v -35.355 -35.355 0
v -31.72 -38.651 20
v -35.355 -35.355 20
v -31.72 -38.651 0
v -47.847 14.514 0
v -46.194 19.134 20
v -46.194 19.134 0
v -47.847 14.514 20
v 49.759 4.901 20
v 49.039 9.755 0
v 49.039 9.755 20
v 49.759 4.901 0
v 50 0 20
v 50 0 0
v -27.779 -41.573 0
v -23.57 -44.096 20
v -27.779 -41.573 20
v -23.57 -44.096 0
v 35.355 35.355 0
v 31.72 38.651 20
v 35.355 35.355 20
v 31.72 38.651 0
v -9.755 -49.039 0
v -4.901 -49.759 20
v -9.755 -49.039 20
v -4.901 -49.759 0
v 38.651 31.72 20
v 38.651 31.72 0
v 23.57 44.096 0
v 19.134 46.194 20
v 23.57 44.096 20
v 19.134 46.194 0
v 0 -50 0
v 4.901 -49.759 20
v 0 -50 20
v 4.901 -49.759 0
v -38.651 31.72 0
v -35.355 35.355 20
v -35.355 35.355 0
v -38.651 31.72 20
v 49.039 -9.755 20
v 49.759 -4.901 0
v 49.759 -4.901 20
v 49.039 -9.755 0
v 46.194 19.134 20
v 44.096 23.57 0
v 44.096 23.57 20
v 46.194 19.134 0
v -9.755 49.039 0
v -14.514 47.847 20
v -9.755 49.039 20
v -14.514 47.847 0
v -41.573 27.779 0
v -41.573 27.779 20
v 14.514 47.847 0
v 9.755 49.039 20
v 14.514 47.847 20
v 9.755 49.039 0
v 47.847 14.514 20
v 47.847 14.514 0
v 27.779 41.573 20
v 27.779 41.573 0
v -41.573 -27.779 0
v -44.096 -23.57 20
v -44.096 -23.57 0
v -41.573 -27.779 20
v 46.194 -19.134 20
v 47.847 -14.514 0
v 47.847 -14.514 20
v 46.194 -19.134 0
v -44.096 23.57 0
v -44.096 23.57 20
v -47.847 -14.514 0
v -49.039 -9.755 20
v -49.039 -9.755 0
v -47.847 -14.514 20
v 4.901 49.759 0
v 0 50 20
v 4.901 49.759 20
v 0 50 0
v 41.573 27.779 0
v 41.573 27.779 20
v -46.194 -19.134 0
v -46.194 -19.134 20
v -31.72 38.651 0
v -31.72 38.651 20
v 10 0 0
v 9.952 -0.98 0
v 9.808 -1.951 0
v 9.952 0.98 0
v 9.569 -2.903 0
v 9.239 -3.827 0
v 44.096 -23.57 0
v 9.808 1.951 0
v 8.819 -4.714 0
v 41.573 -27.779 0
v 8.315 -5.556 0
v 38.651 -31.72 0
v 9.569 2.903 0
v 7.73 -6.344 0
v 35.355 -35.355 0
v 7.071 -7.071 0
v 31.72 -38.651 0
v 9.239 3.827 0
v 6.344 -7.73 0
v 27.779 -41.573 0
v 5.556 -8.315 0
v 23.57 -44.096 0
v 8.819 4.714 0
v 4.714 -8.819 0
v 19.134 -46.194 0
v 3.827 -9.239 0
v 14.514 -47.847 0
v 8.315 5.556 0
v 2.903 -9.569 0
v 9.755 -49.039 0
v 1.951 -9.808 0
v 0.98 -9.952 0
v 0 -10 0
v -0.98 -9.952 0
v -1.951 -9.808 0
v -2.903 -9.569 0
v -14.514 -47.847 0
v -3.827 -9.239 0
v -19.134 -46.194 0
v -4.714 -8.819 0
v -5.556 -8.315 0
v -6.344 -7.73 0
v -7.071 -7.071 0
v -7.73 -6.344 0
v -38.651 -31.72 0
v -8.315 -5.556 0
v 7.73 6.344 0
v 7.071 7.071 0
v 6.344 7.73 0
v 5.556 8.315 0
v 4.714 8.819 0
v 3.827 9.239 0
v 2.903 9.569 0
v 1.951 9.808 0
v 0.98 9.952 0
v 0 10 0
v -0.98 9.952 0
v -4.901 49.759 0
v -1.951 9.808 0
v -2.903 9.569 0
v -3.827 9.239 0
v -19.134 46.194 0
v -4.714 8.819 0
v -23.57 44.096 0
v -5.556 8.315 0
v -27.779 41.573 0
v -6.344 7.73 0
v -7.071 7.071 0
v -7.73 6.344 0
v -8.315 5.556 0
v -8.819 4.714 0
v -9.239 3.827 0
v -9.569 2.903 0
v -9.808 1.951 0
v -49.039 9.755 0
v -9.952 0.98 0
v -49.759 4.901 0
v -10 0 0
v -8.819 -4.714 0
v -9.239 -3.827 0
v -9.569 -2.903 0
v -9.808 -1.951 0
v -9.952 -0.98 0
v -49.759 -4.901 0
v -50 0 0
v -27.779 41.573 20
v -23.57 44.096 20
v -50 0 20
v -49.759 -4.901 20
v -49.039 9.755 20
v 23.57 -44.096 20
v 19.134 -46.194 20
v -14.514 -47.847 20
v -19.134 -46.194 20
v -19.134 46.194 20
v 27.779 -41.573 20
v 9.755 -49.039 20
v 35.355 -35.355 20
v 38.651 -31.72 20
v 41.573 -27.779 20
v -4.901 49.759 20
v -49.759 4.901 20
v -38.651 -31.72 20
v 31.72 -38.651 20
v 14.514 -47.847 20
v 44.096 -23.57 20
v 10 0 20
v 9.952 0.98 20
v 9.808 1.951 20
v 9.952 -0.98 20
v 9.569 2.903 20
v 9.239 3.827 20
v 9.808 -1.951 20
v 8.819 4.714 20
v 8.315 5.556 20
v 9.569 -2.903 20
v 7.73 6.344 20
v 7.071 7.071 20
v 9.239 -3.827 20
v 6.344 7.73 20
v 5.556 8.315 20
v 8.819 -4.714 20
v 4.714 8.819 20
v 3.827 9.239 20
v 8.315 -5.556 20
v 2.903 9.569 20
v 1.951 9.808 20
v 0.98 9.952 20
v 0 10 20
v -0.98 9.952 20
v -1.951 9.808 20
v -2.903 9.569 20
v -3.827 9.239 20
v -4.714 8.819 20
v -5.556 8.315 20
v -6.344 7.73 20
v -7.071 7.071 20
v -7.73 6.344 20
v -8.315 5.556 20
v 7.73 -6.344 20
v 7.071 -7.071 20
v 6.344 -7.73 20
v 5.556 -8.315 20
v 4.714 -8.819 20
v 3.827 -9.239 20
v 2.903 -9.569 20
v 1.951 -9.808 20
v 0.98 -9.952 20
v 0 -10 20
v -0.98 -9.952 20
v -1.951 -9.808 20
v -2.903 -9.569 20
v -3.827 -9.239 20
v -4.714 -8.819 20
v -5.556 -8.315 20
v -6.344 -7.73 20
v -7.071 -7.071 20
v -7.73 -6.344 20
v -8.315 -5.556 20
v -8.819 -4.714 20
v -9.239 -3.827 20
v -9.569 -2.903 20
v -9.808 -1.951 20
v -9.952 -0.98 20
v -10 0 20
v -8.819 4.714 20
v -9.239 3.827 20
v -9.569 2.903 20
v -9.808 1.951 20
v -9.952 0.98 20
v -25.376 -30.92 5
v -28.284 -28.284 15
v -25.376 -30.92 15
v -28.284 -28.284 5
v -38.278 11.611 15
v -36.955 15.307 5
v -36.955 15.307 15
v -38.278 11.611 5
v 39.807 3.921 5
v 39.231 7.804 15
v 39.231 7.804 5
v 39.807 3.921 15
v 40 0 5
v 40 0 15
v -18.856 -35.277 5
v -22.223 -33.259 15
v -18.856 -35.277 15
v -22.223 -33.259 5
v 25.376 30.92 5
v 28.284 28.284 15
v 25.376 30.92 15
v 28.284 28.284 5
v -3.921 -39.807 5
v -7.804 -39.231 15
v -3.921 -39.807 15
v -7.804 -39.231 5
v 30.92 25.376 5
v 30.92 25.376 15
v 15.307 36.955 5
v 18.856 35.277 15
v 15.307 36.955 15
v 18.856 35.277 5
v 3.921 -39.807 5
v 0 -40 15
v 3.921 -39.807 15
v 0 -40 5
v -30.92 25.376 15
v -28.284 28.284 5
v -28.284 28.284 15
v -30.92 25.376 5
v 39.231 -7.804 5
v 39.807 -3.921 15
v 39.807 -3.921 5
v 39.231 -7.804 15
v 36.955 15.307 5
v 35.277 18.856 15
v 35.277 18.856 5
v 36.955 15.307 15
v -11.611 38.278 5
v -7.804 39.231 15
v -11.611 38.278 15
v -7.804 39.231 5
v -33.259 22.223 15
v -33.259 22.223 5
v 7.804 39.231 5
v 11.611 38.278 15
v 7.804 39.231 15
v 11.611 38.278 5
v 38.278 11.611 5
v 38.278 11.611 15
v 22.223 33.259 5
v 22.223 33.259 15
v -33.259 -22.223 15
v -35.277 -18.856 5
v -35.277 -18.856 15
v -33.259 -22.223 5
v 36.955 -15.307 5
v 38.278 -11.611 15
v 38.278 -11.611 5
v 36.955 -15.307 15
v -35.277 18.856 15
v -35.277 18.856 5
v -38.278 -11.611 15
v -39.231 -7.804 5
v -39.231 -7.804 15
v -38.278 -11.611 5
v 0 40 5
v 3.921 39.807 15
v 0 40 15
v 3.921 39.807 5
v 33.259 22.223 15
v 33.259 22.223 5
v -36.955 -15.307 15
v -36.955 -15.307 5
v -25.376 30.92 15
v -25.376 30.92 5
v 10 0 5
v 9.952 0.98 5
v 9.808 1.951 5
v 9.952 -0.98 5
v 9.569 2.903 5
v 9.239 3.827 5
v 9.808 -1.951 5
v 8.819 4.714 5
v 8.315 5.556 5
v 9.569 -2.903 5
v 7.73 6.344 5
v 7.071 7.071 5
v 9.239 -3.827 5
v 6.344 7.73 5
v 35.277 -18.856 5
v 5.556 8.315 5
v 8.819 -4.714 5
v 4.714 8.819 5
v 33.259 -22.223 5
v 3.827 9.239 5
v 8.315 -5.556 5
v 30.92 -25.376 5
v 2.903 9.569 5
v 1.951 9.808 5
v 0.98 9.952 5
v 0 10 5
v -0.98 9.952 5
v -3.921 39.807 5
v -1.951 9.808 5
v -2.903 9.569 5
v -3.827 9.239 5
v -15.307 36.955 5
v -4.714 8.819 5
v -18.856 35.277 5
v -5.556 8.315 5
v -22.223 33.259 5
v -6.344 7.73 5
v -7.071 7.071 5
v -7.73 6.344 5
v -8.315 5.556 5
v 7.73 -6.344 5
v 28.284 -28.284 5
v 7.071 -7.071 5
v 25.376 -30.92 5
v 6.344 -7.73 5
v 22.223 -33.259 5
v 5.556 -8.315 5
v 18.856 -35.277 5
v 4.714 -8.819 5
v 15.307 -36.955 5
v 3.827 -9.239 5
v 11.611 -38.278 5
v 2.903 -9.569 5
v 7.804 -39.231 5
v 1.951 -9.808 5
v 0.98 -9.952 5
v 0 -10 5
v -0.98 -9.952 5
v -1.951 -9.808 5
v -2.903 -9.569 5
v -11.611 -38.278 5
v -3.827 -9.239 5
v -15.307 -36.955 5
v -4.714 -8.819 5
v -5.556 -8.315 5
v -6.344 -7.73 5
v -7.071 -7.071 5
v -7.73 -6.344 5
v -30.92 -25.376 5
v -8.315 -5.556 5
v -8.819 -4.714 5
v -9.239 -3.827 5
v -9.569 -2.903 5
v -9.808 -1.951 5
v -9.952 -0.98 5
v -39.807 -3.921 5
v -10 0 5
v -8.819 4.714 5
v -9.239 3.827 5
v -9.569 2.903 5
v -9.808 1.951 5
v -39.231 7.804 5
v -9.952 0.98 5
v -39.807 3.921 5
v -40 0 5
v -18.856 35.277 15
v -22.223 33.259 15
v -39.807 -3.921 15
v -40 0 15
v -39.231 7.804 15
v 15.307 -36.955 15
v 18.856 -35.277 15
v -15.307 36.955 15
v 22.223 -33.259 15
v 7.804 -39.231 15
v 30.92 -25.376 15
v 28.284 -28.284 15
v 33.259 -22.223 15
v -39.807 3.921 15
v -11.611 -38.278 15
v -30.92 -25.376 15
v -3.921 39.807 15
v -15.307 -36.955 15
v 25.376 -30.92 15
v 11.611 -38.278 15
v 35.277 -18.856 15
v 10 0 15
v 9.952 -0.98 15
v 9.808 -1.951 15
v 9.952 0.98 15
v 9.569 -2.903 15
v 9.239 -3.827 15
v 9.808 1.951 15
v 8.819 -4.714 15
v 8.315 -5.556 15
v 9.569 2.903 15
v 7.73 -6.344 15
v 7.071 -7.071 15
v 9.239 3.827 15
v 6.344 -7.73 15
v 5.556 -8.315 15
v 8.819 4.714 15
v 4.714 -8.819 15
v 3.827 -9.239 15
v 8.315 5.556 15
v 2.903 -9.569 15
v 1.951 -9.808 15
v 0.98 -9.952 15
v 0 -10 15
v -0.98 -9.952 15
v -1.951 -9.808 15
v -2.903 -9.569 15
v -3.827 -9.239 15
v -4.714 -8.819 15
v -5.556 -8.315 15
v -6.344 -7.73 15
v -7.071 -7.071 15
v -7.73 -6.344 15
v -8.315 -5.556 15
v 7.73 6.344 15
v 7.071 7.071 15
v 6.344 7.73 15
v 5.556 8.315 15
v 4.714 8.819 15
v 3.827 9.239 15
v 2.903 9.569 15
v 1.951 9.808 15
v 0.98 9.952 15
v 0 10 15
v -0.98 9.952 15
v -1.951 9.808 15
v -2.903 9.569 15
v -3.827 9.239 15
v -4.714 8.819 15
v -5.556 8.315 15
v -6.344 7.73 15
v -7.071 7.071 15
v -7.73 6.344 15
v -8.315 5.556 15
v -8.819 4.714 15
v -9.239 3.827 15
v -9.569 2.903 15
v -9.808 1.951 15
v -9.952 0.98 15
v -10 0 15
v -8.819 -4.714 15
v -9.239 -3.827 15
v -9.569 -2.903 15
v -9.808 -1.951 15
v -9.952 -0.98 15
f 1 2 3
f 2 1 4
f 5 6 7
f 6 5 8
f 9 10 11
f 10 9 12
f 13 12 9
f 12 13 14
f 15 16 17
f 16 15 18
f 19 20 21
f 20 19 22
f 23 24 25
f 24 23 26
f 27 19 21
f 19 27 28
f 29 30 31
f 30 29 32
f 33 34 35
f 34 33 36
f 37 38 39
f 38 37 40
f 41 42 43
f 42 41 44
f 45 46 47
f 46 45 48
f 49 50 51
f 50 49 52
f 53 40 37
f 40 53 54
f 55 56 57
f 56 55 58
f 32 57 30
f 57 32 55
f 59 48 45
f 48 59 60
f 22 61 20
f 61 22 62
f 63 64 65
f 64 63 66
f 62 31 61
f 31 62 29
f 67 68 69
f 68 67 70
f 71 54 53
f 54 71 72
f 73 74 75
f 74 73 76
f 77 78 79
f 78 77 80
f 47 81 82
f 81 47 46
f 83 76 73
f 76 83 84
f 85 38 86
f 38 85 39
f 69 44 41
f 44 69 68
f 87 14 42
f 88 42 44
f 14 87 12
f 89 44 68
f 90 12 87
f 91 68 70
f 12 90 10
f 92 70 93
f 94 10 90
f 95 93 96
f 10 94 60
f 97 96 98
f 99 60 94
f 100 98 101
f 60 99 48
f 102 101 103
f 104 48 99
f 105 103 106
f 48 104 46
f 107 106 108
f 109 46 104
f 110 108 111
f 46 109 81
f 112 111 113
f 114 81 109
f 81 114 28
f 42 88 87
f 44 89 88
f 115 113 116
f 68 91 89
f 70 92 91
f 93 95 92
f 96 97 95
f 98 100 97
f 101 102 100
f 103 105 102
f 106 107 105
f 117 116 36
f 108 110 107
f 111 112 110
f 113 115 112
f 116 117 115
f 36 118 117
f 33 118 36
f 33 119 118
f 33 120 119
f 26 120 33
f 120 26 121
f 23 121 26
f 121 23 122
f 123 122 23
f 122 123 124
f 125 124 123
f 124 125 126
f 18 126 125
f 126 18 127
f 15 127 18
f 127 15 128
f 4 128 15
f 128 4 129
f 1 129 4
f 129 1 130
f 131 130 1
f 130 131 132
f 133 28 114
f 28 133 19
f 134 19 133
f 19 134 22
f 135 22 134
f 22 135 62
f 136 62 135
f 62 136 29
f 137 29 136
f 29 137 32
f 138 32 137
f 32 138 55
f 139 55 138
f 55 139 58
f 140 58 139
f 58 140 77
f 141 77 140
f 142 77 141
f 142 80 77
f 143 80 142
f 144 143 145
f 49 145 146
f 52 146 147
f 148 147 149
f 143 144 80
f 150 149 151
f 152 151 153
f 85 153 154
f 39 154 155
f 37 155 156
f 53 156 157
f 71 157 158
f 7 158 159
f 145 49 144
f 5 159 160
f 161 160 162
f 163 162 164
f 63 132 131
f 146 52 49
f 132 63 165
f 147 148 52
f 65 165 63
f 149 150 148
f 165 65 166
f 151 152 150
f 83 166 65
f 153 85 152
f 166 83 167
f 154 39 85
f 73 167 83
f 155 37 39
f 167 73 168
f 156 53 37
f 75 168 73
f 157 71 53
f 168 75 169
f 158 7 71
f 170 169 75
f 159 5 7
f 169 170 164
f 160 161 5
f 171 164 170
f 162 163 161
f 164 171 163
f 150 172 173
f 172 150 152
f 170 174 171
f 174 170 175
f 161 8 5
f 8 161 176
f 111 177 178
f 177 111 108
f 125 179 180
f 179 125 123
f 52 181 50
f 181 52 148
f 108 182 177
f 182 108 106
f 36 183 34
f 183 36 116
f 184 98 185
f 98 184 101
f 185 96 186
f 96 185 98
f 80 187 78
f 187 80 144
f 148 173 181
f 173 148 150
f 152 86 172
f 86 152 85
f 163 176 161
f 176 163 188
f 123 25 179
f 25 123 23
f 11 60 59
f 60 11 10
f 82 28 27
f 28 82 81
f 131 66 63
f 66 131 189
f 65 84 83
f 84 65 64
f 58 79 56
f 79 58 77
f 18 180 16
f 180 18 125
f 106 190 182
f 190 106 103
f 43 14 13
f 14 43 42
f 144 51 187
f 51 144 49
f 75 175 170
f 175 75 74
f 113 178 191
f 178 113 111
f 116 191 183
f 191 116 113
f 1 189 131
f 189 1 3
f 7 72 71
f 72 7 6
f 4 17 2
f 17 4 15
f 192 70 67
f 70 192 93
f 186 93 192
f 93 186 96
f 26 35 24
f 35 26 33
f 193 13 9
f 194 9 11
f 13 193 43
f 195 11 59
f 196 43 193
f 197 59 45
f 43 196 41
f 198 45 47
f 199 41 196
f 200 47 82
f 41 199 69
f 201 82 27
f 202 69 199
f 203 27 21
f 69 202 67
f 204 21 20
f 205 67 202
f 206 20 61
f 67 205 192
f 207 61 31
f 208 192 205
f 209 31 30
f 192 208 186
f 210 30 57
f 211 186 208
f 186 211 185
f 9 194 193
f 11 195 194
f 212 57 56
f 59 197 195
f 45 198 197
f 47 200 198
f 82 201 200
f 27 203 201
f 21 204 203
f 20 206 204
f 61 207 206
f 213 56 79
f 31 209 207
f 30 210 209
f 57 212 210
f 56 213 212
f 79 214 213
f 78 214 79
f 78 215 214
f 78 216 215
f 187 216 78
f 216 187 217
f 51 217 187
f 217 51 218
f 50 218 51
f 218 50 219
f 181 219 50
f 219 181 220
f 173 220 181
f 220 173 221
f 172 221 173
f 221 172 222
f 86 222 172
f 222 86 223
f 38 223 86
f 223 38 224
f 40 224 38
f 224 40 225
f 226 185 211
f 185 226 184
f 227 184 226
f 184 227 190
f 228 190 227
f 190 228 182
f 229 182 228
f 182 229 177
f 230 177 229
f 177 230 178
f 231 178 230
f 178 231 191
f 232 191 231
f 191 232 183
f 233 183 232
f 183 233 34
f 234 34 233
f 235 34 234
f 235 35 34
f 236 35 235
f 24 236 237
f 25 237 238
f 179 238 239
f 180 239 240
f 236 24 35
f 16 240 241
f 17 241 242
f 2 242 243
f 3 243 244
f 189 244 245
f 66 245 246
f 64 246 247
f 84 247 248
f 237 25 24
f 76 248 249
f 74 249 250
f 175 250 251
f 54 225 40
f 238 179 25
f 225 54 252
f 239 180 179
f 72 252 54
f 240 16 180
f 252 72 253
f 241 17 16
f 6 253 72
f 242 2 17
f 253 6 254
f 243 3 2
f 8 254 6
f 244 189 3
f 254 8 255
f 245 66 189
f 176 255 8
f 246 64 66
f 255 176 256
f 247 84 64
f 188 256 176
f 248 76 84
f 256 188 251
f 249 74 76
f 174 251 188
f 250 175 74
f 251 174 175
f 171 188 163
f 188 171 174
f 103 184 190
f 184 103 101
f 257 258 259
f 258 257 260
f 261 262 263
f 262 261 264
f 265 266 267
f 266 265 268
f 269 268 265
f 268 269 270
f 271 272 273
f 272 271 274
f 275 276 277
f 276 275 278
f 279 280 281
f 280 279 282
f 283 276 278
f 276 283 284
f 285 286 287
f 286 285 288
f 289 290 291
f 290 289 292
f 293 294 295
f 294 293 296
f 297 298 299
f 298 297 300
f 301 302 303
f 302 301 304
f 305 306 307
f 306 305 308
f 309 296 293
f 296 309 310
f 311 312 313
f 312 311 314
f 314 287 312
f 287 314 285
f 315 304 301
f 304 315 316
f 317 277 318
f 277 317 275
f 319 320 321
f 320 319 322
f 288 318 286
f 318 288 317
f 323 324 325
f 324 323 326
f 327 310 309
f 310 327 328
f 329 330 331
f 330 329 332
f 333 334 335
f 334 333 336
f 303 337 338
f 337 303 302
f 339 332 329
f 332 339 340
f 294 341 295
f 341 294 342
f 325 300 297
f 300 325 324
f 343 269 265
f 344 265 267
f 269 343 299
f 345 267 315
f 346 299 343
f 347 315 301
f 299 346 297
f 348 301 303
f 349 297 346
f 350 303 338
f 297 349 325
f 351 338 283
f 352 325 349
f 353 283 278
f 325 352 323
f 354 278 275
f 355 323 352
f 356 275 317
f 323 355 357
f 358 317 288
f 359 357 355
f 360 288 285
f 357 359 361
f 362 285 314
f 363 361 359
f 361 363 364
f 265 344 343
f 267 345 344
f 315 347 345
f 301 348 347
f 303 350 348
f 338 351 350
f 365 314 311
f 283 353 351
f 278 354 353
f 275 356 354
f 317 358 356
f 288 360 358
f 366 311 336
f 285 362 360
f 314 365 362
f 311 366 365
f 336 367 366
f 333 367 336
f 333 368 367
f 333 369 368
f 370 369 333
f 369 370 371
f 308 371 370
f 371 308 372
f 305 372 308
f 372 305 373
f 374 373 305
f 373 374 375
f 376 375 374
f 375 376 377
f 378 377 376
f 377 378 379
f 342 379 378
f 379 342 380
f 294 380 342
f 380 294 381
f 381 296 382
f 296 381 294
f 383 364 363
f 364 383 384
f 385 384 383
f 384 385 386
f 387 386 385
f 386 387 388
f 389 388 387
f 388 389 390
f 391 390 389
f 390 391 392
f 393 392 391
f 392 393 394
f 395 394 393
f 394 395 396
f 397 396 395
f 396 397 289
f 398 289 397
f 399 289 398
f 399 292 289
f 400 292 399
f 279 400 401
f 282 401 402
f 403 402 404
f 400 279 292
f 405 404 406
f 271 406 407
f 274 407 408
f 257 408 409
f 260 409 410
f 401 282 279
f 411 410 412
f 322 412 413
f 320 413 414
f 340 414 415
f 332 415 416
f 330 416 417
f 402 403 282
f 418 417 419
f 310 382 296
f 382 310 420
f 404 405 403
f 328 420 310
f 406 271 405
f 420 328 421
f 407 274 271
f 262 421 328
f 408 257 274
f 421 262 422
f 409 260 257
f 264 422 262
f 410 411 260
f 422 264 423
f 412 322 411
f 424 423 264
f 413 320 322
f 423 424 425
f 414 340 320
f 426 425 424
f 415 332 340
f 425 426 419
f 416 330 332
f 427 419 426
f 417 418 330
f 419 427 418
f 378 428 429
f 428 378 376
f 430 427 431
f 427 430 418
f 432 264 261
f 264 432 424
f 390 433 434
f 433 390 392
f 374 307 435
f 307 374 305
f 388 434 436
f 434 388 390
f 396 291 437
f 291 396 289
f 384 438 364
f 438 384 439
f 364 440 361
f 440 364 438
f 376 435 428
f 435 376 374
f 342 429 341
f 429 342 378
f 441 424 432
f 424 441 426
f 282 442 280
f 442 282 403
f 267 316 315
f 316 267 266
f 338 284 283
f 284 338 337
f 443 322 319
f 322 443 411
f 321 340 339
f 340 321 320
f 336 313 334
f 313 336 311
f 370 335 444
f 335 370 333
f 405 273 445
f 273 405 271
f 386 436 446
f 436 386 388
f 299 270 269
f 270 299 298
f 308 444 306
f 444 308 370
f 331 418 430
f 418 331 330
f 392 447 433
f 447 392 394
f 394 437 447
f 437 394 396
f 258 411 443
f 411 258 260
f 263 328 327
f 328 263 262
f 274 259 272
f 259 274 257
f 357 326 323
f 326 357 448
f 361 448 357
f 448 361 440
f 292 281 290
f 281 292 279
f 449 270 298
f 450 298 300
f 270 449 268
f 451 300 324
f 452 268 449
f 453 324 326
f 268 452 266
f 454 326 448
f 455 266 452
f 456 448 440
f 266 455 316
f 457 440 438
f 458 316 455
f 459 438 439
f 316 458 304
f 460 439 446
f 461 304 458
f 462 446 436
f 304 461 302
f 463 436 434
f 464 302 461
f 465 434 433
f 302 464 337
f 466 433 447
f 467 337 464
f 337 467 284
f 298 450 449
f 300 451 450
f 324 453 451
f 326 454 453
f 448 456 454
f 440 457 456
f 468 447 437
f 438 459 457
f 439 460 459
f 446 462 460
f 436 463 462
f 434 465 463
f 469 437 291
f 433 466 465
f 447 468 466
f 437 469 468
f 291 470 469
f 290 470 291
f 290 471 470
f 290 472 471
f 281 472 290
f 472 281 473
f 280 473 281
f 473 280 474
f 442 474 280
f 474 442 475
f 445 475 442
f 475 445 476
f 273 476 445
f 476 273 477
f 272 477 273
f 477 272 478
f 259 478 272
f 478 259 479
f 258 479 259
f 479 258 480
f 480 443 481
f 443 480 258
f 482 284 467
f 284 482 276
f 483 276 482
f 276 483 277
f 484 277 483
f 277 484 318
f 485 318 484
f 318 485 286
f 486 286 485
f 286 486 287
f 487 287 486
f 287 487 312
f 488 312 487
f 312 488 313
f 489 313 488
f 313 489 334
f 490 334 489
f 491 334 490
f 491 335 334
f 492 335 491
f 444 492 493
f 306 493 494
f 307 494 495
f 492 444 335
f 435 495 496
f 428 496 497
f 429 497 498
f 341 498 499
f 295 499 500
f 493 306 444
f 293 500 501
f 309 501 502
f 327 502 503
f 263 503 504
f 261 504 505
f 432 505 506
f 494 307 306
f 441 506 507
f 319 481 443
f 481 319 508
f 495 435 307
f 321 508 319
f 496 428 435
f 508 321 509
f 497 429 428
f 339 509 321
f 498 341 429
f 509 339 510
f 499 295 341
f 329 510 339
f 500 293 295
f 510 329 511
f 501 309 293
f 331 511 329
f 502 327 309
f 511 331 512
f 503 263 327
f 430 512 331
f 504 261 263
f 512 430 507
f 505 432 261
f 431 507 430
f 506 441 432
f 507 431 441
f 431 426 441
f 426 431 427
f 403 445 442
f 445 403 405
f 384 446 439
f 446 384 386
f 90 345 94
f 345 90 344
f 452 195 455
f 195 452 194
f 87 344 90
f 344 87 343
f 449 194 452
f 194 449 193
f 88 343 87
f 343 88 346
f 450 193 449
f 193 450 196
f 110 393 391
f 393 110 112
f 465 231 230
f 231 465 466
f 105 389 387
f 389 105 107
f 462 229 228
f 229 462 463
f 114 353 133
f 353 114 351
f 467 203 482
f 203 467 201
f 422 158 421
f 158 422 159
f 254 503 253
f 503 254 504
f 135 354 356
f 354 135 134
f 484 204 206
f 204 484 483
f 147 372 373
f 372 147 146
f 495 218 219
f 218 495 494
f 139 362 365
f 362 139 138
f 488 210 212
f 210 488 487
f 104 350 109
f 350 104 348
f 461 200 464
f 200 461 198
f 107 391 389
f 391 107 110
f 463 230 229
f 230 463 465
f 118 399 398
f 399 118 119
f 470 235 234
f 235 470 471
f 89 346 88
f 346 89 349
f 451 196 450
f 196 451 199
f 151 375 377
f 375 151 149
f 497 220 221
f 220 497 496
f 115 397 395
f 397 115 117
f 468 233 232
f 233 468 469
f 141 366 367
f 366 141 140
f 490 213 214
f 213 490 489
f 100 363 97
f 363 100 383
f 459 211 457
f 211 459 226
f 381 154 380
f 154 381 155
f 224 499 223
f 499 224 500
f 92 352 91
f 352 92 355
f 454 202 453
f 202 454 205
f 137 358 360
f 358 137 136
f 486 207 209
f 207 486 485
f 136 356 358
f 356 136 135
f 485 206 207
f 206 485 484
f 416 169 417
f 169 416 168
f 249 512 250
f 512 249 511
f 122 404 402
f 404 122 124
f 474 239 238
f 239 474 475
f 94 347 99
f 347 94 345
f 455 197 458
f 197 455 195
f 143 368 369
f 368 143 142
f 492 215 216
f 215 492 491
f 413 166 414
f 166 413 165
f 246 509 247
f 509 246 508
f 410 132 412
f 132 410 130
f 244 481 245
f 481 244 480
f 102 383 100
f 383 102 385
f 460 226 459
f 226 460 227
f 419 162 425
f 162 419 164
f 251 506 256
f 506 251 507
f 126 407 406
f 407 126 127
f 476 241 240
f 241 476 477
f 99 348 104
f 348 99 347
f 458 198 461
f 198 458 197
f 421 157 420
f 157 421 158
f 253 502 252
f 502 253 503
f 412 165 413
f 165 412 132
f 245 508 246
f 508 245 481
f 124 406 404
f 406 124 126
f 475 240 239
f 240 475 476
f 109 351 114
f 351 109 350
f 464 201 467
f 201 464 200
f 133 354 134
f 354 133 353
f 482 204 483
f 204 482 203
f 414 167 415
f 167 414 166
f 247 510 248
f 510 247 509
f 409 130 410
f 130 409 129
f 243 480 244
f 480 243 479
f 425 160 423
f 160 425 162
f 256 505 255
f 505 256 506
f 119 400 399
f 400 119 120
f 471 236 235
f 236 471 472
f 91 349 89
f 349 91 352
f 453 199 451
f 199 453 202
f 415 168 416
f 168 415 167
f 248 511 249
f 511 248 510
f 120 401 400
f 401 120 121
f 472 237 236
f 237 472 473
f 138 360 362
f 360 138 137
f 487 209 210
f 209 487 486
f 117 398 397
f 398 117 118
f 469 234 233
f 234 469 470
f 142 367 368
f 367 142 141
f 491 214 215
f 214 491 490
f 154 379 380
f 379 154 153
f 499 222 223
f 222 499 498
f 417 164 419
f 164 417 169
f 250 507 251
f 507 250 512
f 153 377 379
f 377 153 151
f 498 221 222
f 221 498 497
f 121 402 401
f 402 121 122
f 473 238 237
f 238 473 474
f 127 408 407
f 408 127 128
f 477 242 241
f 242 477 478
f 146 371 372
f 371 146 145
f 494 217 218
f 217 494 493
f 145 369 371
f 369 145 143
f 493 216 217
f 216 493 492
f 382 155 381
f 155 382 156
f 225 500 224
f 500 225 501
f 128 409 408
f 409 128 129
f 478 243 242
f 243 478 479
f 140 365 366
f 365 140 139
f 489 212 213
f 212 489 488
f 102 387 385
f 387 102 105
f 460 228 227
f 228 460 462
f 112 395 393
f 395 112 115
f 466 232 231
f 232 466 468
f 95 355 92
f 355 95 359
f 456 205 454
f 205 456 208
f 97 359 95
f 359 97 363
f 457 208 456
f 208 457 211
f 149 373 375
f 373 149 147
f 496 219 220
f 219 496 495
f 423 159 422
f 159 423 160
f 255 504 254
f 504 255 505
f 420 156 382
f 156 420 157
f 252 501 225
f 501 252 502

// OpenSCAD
module pulley() {
    difference() {
        // Outer cylinder for the pulley
        cylinder(h=20, r=50, $fn=64);
        
        // Inner cylinder to create the groove
        translate([0, 0, 5])
            cylinder(h=10, r=40, $fn=64);
        
        // Hole for the axle
        translate([0, 0, -5])
            cylinder(h=30, r=10, $fn=64);
    }
}

pulley();
